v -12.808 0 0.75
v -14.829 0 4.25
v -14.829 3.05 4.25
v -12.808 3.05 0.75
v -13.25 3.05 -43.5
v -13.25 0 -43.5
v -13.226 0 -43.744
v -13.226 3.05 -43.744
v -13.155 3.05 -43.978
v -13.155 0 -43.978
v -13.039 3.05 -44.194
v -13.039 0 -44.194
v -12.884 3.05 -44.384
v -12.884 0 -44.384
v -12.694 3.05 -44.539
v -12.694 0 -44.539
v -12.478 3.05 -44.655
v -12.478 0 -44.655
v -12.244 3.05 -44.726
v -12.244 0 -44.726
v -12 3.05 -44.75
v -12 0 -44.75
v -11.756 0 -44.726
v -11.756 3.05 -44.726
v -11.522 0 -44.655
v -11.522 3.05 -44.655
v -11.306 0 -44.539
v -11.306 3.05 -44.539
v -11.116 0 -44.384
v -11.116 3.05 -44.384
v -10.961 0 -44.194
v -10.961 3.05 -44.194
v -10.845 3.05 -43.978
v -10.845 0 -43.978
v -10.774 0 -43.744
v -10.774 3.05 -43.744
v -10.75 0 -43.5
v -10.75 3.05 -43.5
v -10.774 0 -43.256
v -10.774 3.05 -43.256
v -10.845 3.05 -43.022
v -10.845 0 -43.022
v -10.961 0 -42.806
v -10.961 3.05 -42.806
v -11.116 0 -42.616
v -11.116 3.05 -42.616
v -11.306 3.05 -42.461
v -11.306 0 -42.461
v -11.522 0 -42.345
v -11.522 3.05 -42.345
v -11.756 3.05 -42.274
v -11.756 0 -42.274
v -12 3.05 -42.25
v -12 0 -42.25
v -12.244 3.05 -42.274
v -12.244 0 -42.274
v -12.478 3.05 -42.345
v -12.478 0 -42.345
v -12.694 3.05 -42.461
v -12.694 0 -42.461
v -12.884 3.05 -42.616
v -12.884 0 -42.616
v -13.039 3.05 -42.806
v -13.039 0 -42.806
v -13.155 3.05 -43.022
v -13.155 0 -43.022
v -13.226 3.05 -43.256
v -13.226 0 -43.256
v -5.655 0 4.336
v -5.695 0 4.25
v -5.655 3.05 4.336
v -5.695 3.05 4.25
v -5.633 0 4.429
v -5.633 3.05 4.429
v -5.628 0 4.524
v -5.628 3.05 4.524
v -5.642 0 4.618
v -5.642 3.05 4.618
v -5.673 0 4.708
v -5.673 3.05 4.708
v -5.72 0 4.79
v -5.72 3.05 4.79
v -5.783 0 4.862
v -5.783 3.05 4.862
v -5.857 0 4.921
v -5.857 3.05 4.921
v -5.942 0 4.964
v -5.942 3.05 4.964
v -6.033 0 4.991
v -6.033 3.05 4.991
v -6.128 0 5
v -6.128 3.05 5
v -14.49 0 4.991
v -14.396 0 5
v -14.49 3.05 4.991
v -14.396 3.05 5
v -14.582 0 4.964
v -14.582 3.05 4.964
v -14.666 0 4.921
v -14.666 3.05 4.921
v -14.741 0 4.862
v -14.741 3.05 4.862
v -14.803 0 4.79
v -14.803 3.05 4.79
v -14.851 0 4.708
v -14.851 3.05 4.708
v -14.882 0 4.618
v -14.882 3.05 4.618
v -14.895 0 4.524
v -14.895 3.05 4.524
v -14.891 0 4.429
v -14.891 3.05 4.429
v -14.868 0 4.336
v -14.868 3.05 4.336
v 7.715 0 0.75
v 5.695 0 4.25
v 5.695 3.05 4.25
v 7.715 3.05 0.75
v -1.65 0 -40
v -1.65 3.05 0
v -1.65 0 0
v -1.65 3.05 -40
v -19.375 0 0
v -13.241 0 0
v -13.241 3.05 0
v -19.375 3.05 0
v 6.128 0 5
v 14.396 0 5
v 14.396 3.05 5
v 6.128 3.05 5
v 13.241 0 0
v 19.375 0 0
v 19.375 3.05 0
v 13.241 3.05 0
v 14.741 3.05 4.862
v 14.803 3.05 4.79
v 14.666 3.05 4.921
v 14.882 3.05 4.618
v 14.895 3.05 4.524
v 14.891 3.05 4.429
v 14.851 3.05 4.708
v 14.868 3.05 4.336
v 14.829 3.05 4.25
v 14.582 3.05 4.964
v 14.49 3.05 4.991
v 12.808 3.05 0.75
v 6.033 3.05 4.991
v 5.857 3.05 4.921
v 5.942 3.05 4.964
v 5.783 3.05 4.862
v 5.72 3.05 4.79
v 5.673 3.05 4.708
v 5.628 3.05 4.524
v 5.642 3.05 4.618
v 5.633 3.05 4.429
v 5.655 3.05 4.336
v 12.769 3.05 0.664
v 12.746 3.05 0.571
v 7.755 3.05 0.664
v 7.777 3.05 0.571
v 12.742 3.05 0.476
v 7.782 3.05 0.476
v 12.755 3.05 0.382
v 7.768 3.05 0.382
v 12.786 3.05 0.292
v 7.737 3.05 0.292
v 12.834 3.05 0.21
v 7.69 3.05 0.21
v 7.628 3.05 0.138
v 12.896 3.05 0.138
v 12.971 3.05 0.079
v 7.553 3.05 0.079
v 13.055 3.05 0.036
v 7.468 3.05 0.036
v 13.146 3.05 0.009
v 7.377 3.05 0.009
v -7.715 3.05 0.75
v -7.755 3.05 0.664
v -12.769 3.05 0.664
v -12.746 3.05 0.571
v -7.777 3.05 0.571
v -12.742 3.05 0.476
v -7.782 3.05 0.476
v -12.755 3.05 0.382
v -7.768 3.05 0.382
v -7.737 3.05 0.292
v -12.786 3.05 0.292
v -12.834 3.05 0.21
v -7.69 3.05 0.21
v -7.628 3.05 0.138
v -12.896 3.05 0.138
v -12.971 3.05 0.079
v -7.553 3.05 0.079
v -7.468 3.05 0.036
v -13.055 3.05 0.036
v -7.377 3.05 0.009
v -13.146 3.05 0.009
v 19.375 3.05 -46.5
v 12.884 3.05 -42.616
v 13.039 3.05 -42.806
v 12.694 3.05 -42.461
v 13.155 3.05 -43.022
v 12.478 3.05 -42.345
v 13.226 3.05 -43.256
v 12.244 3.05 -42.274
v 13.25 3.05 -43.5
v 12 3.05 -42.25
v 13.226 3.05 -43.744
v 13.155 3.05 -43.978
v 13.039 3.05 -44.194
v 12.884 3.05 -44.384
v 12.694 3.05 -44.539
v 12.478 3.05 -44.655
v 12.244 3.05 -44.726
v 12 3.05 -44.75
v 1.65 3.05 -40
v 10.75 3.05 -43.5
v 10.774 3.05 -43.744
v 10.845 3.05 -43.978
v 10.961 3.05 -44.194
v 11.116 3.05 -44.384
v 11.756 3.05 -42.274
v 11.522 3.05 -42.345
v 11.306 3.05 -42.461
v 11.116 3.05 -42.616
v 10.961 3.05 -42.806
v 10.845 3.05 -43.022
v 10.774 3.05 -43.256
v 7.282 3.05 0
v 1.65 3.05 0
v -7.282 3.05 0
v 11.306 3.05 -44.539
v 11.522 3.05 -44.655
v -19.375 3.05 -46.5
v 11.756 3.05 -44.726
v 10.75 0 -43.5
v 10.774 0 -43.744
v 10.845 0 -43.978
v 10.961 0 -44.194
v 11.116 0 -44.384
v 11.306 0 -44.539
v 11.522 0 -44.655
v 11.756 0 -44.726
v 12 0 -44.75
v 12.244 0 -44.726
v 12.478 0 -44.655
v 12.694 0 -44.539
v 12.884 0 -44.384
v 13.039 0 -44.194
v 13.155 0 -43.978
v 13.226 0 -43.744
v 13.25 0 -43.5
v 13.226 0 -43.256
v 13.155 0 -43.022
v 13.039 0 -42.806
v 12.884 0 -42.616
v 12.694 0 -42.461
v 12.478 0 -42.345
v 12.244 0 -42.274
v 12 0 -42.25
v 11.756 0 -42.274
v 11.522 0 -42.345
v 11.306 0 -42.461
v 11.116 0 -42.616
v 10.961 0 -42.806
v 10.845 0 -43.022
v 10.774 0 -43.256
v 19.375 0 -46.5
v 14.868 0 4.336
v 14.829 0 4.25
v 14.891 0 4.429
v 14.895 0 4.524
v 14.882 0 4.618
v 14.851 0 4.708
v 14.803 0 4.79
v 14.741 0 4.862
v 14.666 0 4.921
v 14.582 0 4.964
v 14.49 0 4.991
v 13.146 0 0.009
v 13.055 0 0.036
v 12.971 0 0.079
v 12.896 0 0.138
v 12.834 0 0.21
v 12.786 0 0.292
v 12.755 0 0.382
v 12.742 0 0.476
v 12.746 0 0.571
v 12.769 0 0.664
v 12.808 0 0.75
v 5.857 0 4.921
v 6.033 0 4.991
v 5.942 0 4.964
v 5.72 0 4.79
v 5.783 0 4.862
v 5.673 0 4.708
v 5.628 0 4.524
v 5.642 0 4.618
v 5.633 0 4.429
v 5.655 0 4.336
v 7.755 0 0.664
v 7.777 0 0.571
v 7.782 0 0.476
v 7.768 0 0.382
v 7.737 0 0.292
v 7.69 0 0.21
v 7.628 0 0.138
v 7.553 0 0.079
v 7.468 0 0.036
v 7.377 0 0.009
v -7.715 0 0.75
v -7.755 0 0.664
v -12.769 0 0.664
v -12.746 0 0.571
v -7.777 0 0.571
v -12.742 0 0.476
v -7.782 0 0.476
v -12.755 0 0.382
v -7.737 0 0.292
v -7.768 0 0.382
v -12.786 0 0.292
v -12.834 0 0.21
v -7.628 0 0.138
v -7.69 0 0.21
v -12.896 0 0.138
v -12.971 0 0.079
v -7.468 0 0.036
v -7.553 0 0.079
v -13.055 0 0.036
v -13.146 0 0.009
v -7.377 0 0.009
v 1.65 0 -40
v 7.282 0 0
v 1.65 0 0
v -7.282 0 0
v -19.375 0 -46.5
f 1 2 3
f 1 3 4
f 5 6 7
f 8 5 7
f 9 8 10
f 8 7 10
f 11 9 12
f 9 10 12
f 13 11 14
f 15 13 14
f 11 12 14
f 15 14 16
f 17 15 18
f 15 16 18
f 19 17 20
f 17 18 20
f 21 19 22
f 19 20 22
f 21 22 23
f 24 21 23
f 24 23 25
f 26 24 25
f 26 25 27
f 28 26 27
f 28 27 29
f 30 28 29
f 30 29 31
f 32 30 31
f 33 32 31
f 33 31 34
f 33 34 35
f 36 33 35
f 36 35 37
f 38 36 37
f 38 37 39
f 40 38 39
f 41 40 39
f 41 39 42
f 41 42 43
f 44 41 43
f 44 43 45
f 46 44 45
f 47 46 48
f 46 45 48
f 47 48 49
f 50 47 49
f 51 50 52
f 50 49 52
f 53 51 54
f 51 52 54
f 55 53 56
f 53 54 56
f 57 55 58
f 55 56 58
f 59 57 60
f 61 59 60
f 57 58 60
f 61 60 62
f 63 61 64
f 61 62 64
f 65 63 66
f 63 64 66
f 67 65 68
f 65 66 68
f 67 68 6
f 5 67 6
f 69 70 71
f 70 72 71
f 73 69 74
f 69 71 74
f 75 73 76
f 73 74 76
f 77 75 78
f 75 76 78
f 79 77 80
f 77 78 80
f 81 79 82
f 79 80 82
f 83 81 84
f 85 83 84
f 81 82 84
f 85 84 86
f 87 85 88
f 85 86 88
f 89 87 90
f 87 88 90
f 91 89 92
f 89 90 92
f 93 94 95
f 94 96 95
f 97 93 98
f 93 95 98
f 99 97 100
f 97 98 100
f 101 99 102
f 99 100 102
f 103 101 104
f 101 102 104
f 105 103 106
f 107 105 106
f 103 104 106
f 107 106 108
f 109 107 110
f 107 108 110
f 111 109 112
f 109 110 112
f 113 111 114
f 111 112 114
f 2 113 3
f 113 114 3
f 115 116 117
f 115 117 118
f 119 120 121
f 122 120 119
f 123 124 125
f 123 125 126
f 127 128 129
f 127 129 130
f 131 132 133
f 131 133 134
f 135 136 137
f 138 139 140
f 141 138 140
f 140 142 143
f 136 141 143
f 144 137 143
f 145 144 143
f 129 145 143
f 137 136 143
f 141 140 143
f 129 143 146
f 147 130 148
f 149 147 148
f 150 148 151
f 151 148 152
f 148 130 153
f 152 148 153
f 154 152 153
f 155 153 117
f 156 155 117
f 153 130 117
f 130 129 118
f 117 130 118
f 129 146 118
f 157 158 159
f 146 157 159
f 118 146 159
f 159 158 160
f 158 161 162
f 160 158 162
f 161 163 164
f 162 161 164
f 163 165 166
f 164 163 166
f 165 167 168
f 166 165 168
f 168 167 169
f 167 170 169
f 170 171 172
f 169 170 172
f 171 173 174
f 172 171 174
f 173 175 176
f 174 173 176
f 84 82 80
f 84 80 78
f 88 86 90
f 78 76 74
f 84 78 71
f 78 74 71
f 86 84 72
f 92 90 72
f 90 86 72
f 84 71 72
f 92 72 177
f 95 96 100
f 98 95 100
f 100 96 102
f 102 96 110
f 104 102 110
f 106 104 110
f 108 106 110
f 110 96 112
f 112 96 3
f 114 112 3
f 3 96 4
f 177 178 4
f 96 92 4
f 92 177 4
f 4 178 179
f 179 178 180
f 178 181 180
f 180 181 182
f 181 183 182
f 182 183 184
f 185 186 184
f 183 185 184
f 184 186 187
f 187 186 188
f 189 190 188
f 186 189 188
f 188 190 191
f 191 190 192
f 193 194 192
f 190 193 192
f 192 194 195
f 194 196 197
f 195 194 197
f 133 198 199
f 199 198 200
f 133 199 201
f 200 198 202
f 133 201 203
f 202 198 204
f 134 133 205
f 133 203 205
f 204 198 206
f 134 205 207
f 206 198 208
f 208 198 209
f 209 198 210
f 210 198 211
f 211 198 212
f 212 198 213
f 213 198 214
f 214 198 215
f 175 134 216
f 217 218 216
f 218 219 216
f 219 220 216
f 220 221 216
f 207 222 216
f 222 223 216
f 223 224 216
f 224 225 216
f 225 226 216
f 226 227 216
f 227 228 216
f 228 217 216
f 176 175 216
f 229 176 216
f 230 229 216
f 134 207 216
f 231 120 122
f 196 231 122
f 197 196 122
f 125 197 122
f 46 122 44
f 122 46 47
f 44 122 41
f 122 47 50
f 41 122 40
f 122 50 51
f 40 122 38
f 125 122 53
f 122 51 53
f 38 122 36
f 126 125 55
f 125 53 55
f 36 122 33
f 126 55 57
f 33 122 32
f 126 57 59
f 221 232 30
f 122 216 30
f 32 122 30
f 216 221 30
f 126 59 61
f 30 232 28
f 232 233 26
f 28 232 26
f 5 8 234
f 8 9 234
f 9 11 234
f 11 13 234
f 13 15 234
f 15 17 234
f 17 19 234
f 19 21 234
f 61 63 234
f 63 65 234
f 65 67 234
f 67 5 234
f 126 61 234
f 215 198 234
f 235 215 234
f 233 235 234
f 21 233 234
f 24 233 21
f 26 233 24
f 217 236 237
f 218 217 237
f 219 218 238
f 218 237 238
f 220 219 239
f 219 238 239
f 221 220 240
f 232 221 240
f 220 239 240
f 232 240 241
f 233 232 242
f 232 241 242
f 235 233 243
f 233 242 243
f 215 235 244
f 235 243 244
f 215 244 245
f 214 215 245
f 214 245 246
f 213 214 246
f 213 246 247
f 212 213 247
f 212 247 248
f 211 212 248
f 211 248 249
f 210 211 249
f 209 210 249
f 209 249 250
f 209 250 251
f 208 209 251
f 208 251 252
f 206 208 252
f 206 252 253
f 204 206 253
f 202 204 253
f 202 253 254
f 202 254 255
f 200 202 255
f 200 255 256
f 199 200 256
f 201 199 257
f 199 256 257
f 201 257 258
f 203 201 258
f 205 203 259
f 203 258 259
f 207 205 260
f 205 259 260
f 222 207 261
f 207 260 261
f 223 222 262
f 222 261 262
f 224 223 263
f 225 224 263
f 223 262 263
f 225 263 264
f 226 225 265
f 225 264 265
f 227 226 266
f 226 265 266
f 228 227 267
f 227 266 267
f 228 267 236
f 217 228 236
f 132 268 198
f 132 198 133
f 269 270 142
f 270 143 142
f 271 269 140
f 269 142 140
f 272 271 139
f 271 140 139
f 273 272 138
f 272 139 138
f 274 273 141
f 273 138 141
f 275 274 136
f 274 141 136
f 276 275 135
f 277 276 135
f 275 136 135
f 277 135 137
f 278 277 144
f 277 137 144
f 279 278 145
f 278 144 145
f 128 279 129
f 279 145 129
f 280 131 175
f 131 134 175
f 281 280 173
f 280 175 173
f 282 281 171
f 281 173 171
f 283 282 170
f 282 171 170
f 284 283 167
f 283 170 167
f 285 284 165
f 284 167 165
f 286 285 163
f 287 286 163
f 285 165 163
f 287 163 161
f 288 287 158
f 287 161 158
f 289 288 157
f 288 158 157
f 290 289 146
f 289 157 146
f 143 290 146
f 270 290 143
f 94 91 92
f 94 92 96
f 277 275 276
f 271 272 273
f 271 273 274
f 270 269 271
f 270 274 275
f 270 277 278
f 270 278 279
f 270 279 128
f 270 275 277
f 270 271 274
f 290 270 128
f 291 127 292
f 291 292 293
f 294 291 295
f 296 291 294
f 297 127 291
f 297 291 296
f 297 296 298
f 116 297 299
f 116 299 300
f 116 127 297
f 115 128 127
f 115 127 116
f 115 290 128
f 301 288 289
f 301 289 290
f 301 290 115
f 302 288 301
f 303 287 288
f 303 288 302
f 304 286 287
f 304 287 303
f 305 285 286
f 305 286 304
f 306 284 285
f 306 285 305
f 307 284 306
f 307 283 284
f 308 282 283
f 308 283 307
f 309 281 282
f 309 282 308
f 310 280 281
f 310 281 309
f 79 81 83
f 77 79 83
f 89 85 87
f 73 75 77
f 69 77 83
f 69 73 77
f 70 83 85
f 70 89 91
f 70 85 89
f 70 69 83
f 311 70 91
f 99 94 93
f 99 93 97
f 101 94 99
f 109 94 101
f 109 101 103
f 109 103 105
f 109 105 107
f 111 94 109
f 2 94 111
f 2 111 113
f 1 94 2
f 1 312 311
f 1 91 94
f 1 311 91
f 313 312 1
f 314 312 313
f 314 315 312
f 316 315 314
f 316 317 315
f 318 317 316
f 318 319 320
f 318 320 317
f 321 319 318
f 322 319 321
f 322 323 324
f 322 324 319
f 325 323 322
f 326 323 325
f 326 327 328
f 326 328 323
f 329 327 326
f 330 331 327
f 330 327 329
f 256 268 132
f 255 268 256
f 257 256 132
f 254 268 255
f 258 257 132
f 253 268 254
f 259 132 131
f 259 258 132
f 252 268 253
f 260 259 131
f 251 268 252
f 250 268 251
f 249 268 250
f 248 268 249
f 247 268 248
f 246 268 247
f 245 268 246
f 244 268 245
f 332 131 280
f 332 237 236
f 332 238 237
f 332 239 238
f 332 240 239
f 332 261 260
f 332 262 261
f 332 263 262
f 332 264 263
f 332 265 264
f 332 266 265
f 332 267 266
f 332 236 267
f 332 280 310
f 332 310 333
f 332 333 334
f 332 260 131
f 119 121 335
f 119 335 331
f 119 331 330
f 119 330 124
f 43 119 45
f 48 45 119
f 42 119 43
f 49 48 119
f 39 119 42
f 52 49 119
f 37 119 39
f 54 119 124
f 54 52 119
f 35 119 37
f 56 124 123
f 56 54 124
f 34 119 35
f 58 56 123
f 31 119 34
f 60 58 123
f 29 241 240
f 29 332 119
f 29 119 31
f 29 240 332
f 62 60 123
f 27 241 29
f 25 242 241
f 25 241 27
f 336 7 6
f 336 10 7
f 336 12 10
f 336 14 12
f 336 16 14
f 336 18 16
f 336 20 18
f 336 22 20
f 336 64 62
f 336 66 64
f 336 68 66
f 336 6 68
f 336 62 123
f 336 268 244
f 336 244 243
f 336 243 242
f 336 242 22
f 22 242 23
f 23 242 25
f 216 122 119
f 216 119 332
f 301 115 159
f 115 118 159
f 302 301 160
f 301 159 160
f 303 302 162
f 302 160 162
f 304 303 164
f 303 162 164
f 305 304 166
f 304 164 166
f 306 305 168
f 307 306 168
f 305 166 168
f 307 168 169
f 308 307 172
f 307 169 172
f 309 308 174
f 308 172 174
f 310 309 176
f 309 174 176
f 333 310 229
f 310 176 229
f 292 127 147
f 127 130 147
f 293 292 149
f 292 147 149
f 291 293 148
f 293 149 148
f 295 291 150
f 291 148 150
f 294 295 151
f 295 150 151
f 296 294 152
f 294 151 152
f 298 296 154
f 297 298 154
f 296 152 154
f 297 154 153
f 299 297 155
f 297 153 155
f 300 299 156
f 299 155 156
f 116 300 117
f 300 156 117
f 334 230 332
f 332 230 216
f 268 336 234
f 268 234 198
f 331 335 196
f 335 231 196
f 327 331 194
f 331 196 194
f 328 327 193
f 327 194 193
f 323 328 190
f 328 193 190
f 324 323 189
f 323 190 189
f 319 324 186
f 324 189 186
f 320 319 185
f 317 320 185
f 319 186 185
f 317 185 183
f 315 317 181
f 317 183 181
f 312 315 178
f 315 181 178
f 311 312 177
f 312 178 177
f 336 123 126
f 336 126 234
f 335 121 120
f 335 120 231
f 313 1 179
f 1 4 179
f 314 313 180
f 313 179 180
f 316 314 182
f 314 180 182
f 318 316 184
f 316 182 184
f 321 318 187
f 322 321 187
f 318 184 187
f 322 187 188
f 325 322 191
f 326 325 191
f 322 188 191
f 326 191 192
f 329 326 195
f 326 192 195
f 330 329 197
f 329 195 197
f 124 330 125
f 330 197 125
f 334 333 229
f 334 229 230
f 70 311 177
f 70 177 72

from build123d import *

# Parameters (mm, degrees)
BOSS_EXTRUDE1_DEPTH      = 3.05
FILLET1_R                = 0.5
SKETCH3_W                = 3.3
SKETCH3_H                = 40
SKETCH3_H_2              = 1
CUT_EXTRUDE2_DEPTH       = 51.467248043
M3_TAPPED_DAMPER_HOLES_D = 2.5


with BuildPart() as part:
    # Sketch1 → Boss-Extrude1 (new body)
    with BuildSketch(Plane(origin=(0, 0, 0), x_dir=(1, 0, 0), z_dir=(0, 1, 0))):
        Polygon((-19.375, 0), (-19.375, 46.5), (19.375, 46.5), (19.375, 0), (12.375, 0), (15.261751346, -5), (5.261751346, -5), (8.148502692, 0), (-8.148502692, 0), (-5.261751346, -5), (-15.261751346, -5), (-12.375, 0), align=None)
    extrude(amount=BOSS_EXTRUDE1_DEPTH)

    # Fillet1
    fillet1_edges = [part.edges().sort_by_distance(p)[0] for p in [
        (12.375, 1.525, 0),
        (15.261751346, 1.525, 5),
        (5.261751346, 1.525, 5),
        (8.148502692, 1.525, 0),
        (-8.148502692, 1.525, 0),
        (-5.261751346, 1.525, 5),
        (-15.261751346, 1.525, 5),
        (-12.375, 1.525, 0),
    ]]
    fillet(fillet1_edges, radius=FILLET1_R)

    # Sketch3 → Cut-Extrude2 (cut, through all)
    with BuildSketch(Plane(origin=(0, 3.05, 0), x_dir=(1, 0, 0), z_dir=(0, 1, 0))):
        with Locations((0, 20)):
            Rectangle(SKETCH3_W, SKETCH3_H)
        with Locations((0, -1.7)):
            Rectangle(SKETCH3_W, SKETCH3_H_2)
    extrude(amount=-CUT_EXTRUDE2_DEPTH, mode=Mode.SUBTRACT)

    # M3 Tapped Damper Holes (through all)
    with Locations(Plane(origin=(0, 3.05, 0), x_dir=(1, 0, 0), z_dir=(0, 1, 0))):
        with Locations((-12, 43.5), (12, 43.5)):
            Hole(M3_TAPPED_DAMPER_HOLES_D / 2)


solid = part.part
